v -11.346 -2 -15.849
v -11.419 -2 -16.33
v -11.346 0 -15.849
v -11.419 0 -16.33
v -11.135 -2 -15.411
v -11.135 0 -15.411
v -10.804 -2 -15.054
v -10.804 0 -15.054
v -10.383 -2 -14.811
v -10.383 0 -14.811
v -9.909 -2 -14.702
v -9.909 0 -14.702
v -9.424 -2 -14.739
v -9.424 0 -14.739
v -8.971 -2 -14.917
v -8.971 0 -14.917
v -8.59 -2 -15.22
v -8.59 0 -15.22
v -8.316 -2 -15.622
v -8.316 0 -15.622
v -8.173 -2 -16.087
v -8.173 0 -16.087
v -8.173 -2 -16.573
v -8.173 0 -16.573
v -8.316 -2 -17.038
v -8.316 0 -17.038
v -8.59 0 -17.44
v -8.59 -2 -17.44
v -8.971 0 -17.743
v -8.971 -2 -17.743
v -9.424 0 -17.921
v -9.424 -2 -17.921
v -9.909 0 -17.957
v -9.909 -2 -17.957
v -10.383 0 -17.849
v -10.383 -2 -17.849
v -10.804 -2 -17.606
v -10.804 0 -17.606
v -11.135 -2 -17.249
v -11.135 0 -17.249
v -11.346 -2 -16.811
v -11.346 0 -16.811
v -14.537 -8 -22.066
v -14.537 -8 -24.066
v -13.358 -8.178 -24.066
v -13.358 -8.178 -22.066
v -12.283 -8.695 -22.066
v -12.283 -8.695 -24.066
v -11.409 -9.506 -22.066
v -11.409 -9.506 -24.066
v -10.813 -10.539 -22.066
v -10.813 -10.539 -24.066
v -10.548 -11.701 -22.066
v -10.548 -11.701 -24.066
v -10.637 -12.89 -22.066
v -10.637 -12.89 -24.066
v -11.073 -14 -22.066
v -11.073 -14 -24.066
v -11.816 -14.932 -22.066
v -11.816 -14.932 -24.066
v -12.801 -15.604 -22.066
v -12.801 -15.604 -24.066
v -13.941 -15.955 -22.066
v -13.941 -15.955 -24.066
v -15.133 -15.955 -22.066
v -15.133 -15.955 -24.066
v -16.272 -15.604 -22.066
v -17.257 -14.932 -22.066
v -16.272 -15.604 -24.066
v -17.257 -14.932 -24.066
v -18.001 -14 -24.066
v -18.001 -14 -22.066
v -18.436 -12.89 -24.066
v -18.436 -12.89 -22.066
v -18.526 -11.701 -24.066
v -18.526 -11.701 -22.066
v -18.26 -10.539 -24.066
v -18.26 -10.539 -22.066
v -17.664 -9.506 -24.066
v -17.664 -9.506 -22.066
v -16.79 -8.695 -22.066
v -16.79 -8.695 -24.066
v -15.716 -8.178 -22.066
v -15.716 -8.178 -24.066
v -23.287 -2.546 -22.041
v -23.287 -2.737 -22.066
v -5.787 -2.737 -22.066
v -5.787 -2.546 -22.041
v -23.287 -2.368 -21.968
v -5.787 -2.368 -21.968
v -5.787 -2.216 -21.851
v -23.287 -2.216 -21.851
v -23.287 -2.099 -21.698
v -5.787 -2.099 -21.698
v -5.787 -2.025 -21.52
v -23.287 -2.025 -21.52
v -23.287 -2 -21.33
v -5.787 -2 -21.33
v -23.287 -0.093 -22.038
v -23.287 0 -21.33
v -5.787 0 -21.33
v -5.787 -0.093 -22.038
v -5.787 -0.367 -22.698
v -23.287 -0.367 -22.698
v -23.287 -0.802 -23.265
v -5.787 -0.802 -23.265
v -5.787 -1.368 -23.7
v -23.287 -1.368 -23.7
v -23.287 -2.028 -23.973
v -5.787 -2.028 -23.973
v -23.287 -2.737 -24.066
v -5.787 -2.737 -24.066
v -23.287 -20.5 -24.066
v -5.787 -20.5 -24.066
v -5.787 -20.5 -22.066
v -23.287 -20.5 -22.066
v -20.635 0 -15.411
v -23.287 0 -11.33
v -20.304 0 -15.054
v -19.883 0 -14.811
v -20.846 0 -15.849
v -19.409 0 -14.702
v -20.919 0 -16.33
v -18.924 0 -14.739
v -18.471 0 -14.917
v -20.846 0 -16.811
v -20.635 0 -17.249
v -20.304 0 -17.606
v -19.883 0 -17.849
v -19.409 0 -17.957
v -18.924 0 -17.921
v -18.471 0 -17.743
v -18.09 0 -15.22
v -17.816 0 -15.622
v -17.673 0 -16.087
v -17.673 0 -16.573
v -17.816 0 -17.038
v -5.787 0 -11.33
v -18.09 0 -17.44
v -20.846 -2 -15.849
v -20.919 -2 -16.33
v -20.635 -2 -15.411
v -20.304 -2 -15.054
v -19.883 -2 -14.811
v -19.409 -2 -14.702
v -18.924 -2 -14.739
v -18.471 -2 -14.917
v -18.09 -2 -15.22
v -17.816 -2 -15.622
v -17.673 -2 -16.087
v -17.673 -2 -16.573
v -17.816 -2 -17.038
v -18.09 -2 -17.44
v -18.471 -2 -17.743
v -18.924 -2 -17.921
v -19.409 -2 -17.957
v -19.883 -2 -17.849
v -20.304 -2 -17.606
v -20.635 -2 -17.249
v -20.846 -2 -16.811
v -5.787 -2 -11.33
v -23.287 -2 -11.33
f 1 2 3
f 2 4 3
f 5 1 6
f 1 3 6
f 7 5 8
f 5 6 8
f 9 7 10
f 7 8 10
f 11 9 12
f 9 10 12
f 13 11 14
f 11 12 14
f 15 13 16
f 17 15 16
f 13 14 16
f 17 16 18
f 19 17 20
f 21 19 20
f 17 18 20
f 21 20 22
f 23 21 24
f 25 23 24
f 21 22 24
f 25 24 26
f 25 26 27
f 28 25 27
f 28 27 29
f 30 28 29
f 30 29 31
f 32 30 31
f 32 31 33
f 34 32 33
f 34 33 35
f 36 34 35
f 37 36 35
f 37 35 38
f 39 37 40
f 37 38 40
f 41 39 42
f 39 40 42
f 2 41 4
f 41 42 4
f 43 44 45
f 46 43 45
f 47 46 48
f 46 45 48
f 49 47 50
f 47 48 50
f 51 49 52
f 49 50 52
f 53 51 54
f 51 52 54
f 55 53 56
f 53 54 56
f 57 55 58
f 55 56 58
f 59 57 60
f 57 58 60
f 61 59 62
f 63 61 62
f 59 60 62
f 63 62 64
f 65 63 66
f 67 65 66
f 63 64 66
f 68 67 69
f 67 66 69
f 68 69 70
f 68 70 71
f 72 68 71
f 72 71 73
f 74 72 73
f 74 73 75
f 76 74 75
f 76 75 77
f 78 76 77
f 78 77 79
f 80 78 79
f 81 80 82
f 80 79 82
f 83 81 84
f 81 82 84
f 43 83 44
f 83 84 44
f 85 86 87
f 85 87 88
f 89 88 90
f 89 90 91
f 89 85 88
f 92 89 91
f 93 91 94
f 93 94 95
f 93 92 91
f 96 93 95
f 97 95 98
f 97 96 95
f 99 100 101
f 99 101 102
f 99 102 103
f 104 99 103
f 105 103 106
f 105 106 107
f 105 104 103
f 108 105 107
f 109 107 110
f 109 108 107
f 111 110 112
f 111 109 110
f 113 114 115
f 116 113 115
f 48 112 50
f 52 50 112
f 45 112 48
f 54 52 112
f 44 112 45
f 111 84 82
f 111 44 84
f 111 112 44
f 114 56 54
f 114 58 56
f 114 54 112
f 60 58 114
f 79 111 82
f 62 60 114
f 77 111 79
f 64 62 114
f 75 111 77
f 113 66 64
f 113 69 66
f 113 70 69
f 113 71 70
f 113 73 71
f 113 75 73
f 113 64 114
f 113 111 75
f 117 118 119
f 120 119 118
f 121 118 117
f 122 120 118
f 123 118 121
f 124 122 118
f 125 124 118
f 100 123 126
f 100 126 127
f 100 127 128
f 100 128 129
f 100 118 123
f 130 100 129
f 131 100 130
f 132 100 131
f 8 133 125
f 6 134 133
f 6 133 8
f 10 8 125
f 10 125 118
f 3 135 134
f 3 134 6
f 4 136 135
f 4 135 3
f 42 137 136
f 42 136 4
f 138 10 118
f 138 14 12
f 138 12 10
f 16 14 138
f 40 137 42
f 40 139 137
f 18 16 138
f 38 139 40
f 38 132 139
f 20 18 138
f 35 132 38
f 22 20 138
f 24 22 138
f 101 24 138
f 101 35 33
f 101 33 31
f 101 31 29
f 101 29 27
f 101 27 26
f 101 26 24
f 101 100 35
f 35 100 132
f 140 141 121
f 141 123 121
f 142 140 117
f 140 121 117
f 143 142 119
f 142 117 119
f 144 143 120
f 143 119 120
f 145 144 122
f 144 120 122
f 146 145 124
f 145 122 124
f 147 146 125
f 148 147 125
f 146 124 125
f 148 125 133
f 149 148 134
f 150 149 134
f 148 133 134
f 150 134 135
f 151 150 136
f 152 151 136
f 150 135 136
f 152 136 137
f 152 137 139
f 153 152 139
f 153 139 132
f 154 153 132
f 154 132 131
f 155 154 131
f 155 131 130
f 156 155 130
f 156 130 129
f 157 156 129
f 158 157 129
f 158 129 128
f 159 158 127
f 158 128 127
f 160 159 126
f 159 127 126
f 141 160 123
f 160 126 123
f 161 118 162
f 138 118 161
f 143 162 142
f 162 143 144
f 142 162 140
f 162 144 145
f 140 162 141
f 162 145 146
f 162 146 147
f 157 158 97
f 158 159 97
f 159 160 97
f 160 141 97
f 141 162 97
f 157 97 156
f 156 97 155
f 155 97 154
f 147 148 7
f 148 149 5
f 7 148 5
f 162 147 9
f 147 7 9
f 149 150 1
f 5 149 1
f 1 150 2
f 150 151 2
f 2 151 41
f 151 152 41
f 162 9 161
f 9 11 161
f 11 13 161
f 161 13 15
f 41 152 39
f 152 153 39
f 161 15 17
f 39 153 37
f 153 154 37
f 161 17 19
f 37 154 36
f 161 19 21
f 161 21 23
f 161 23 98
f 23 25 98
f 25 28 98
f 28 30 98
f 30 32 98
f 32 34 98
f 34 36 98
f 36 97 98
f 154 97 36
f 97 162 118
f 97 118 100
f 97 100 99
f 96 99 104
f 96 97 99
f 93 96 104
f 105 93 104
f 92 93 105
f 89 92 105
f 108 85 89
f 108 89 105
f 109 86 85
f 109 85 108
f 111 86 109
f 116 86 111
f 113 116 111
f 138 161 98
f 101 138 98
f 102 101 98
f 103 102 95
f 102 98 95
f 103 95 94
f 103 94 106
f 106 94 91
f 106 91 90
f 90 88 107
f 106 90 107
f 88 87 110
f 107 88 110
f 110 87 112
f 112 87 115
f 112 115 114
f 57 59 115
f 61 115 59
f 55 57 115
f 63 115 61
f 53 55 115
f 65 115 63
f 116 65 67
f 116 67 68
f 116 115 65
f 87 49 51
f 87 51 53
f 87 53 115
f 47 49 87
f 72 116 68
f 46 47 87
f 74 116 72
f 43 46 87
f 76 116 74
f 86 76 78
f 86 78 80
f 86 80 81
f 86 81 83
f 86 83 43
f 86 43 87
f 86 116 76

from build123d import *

# Parameters (mm, degrees)
SKETCH1_W                 = 17.5
SKETCH1_H                 = 10
BASE_FLANGE1_DEPTH        = 2
F_4_CLEARANCE_HOLE1_D     = 3.2639
F_4_CLEARANCE_HOLE1_DEPTH = 2
F_4_CLEARANCE_HOLE1_TIP   = 0.980574487
EDGE_FLANGE1_DEPTH        = 17.5
SKETCH20_R                = 4
CUT_EXTRUDE1_DEPTH        = 2


# Sheet-metal steps are written as plain solids
with BuildPart() as part:
    # Sketch1 → Base-Flange1 (new body)
    with BuildSketch(Plane(origin=(0, 0, 0), x_dir=(1, 0, 0), z_dir=(0, 1, 0))):
        with Locations((-14.536713287, 16.32983683)):
            Rectangle(SKETCH1_W, SKETCH1_H)
    extrude(amount=-BASE_FLANGE1_DEPTH)

    # #4 Clearance Hole1
    with Locations(Plane.XZ.offset(2)):
        with Locations((-9.786713287, -16.32983683), (-19.286713287, -16.32983683)):
            Hole(F_4_CLEARANCE_HOLE1_D / 2, depth=F_4_CLEARANCE_HOLE1_DEPTH)
            with Locations((0, 0, -(F_4_CLEARANCE_HOLE1_DEPTH + F_4_CLEARANCE_HOLE1_TIP / 2))):  # 118° drill point
                Cone(0, F_4_CLEARANCE_HOLE1_D / 2, F_4_CLEARANCE_HOLE1_TIP, mode=Mode.SUBTRACT)

    # Edge-Flange1 section (across the edge) → Edge-Flange1 (add)
    with BuildSketch(Plane(origin=(-23.286713287, -2, -22.06643683), x_dir=(0, 0, 1), z_dir=(1, 0, 0))):
        with BuildLine():
            Line((-2, 0.7366), (-2, 18.5))
            Line((-2, 18.5), (0, 18.5))
            Line((0, 18.5), (0, 0.7366))
            ThreePointArc((0, 0.7366), (0.215745145, 0.215745145), (0.7366, 0))
            Line((0.7366, 0), (0.7366, -2))
            ThreePointArc((0.7366, -2), (-1.198468417, -1.198468417), (-2, 0.7366))
        make_face()
    extrude(amount=EDGE_FLANGE1_DEPTH)

    # Sketch20 → Cut-Extrude1 (cut)
    with BuildSketch(Plane(origin=(0, 0, -24.06643683), x_dir=(-1, 0, 0), z_dir=(0, 0, -1))):
        with Locations(Location((14.536713287, -12, 0), (0, 0, 90))):
            Circle(SKETCH20_R)
    extrude(amount=-CUT_EXTRUDE1_DEPTH, mode=Mode.SUBTRACT)


solid = part.part
